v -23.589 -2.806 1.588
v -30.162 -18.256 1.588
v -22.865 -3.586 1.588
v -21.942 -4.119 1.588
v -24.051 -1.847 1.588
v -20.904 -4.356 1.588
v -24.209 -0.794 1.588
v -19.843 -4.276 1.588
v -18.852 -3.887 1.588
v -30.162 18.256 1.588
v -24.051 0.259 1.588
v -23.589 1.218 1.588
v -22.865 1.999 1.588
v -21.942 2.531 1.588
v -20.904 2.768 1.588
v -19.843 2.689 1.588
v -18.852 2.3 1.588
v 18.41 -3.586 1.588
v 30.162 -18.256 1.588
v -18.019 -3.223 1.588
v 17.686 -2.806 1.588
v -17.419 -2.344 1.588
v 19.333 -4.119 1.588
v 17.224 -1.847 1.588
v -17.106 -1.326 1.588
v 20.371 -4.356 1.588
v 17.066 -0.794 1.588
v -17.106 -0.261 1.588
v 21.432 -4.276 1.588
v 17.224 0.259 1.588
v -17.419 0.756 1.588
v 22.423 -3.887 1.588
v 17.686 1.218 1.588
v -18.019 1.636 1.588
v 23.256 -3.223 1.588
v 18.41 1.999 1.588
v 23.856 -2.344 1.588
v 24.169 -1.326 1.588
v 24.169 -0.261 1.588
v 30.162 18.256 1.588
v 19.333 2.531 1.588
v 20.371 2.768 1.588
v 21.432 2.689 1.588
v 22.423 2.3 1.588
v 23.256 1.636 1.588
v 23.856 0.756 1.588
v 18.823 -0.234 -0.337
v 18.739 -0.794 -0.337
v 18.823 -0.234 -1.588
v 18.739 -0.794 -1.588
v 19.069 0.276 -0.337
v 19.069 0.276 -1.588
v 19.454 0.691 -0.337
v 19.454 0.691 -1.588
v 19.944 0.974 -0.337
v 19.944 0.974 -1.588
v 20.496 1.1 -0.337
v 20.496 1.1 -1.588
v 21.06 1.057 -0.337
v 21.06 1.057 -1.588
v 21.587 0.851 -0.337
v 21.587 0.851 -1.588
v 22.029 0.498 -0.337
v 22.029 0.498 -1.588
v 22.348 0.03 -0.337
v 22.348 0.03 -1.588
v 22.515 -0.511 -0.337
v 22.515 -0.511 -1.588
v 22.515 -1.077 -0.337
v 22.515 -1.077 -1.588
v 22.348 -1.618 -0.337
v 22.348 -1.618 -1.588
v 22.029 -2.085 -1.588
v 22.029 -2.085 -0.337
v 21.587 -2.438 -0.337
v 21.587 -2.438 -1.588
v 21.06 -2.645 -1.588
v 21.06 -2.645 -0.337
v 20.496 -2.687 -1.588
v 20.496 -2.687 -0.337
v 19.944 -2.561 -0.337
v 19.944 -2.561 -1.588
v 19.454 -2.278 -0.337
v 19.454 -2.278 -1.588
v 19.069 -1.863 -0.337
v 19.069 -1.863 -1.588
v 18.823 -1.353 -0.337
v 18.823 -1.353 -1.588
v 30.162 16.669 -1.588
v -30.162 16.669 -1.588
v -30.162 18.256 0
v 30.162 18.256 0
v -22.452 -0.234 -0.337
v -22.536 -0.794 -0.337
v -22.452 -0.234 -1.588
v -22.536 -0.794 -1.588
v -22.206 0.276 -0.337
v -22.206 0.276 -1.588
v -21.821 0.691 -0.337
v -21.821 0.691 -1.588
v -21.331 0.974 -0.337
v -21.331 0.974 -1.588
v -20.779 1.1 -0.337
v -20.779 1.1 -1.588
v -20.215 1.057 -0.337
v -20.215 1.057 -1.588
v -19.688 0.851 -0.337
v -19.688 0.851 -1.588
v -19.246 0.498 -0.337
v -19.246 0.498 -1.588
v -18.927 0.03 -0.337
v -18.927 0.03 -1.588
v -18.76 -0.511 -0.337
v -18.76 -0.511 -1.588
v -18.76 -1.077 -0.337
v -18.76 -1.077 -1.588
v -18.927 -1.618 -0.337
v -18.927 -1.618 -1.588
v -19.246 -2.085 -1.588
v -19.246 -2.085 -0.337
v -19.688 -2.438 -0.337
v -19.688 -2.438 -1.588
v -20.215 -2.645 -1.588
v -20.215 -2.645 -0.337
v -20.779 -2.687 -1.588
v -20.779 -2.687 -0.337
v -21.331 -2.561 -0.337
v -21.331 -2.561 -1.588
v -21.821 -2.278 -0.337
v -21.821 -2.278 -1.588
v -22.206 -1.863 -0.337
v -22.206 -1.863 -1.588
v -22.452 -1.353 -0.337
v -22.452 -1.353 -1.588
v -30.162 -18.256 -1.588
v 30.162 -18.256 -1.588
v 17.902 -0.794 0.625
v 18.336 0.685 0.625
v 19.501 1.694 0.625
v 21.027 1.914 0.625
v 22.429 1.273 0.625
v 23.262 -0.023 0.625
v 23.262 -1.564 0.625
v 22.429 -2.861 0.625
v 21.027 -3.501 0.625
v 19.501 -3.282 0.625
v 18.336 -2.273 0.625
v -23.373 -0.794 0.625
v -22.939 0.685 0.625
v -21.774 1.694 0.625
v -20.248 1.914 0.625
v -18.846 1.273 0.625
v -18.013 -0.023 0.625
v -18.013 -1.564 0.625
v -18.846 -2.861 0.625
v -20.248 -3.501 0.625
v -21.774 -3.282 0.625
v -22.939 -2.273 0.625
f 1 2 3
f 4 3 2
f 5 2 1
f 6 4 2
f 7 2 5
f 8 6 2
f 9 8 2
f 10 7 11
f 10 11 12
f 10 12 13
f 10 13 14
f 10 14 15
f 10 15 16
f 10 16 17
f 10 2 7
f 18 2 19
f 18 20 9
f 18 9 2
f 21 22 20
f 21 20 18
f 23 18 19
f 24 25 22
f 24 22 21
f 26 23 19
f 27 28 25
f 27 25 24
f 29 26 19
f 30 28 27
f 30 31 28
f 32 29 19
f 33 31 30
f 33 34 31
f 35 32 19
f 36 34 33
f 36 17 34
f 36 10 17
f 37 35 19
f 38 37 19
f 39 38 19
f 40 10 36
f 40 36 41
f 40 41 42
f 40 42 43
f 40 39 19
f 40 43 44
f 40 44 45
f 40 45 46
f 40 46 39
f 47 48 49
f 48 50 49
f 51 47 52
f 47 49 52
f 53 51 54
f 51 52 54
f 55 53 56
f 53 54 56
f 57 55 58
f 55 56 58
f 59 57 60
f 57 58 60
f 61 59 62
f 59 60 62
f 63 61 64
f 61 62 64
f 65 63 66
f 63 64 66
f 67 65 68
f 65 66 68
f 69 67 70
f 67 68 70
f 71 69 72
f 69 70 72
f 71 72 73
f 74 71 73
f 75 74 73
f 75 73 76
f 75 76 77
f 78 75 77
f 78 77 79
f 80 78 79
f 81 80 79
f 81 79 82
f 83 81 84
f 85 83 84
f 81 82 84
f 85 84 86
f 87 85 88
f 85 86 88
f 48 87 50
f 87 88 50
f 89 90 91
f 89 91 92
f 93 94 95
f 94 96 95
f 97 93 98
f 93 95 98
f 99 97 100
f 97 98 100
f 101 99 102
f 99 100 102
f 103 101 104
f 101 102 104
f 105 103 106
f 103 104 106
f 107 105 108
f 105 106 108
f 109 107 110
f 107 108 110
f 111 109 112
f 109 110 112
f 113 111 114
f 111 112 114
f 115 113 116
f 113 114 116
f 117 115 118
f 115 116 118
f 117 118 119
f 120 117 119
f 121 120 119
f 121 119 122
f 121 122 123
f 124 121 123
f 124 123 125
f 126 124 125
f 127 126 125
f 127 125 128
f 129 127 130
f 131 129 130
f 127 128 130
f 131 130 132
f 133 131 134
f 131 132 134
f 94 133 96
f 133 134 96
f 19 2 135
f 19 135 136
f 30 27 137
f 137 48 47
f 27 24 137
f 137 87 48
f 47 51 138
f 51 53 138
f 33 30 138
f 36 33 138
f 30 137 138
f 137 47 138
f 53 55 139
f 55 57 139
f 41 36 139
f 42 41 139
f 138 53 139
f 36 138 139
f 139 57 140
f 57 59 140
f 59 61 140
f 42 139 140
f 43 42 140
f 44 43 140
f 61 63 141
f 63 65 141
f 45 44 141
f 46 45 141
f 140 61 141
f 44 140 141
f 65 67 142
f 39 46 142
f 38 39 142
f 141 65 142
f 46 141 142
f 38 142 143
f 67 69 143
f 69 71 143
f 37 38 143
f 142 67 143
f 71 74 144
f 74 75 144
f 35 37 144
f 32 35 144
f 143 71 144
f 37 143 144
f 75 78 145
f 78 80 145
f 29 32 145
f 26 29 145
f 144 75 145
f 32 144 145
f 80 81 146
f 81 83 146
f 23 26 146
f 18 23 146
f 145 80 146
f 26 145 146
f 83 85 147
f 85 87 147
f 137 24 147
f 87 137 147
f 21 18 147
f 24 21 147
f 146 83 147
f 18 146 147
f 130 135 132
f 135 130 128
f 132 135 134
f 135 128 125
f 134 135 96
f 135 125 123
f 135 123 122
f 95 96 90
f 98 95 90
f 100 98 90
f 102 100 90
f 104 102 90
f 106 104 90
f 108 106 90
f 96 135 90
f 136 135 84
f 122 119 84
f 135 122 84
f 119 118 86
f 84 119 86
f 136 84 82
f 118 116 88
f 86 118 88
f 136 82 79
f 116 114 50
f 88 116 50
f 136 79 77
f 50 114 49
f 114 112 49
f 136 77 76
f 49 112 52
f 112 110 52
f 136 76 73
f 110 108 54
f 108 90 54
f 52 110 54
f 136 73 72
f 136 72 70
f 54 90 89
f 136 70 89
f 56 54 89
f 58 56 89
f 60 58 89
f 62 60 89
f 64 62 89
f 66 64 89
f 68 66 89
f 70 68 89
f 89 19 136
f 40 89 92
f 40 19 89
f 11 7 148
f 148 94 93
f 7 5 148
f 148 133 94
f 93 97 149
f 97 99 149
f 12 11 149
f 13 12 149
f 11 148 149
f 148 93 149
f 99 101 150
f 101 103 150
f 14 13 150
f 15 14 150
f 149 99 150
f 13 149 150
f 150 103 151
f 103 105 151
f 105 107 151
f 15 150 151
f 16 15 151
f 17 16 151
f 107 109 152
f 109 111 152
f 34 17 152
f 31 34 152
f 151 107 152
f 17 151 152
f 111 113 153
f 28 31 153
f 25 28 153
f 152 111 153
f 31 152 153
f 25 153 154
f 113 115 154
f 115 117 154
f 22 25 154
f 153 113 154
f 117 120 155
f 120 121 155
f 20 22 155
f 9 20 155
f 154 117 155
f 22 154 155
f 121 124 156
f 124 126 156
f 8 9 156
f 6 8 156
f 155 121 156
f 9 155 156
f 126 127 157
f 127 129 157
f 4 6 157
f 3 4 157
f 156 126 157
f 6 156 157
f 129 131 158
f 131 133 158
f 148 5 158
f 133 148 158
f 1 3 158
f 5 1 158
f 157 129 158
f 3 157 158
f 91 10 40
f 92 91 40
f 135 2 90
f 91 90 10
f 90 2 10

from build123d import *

# Parameters (mm, degrees)
SKETCH1_W                       = 60.325
SKETCH1_H                       = 36.5125
EXTRUDE1_DEPTH                  = 1.5875
CHAMFER1_SIZE                   = 1.5875
F_6_CLEARANCE_HOLE1_D           = 3.7973
F_6_CLEARANCE_HOLE1_DEPTH       = 25.4
F_6_CLEARANCE_HOLE1_CSINK_D     = 7.14375
F_6_CLEARANCE_HOLE1_CSINK_ANGLE = 82
F_6_CLEARANCE_HOLE1_TIP         = 1.140824014


with BuildPart() as part:
    # Sketch1 → Extrude1 (new body, symmetric)
    with BuildSketch(Plane.XY):
        Rectangle(SKETCH1_W, SKETCH1_H)
    extrude(amount=EXTRUDE1_DEPTH, both=True)

    # Chamfer1
    chamfer1_edges = [part.edges().sort_by_distance(p)[0] for p in [
        (0, 18.25625, -1.5875),
    ]]
    chamfer(chamfer1_edges, length=CHAMFER1_SIZE)

    # #6 Clearance Hole1
    with Locations(Plane(origin=(-20.6375, -0.79375, 1.5875), x_dir=(1, 0, 0), z_dir=(0, 0, 1))):
        with Locations((0, 0), (41.275, 0)):
            CounterSinkHole(F_6_CLEARANCE_HOLE1_D / 2, F_6_CLEARANCE_HOLE1_CSINK_D / 2, depth=F_6_CLEARANCE_HOLE1_DEPTH, counter_sink_angle=F_6_CLEARANCE_HOLE1_CSINK_ANGLE)
            with Locations((0, 0, -(F_6_CLEARANCE_HOLE1_DEPTH + F_6_CLEARANCE_HOLE1_TIP / 2))):  # 118° drill point
                Cone(0, F_6_CLEARANCE_HOLE1_D / 2, F_6_CLEARANCE_HOLE1_TIP, mode=Mode.SUBTRACT)


solid = part.part
